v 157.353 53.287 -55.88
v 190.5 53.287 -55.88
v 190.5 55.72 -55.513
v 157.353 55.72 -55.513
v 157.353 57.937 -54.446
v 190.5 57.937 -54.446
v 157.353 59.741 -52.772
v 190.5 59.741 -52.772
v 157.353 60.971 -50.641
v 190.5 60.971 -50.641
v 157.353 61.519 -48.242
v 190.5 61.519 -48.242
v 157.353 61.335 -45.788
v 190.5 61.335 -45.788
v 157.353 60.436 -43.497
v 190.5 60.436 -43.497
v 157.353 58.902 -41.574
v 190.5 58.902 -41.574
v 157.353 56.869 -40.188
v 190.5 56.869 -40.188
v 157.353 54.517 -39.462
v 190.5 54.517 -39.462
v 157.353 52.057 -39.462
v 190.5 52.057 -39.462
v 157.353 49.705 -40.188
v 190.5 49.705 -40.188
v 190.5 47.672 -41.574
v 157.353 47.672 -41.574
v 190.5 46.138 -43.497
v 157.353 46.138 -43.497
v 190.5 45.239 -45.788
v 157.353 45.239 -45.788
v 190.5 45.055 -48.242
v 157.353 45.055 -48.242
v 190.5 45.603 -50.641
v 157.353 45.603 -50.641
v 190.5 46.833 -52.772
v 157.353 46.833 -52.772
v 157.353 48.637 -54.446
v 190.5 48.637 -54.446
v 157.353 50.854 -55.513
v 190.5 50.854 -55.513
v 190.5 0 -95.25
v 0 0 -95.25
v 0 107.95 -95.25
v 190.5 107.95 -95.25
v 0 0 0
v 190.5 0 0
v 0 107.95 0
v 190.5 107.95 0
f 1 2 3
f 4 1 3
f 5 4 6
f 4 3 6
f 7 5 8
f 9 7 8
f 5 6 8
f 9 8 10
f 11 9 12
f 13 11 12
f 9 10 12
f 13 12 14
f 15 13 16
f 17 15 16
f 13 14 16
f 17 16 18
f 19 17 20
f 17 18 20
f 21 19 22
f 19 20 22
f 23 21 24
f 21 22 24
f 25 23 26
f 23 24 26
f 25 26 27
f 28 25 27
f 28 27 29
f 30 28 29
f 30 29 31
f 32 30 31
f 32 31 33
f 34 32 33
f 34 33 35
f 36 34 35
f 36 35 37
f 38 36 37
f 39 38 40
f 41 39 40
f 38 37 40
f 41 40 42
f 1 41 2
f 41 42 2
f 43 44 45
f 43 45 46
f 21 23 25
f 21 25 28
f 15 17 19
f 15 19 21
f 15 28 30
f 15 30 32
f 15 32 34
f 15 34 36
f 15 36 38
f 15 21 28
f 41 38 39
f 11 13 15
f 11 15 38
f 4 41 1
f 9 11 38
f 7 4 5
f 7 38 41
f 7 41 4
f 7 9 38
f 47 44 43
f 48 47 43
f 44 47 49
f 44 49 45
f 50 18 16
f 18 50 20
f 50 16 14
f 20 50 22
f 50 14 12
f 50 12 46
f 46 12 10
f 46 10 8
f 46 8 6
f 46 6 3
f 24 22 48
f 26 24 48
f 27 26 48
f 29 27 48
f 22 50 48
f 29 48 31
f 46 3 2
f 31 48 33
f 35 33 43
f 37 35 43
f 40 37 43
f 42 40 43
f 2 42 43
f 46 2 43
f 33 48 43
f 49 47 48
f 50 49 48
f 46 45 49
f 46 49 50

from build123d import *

# Parameters (mm, degrees)
SKETCH1_W           = 190.5
SKETCH1_H           = 95.25
BOSS_EXTRUDE1_DEPTH = 107.95
SKETCH2_R           = 8.255
CUT_EXTRUDE1_DEPTH  = 33.147


with BuildPart() as part:
    # Sketch1 → Boss-Extrude1 (new body)
    with BuildSketch(Plane(origin=(0, 0, 0), x_dir=(1, 0, 0), z_dir=(0, 1, 0))):
        with Locations((95.25, 47.625)):
            Rectangle(SKETCH1_W, SKETCH1_H)
    extrude(amount=BOSS_EXTRUDE1_DEPTH)

    # Sketch2 → Cut-Extrude1 (cut, symmetric)
    with BuildSketch(Plane(origin=(190.5, 0, 0), x_dir=(0, 0, -1), z_dir=(1, 0, 0))):
        with Locations((47.625, 53.286871915)):
            Circle(SKETCH2_R)
    extrude(amount=CUT_EXTRUDE1_DEPTH, both=True, mode=Mode.SUBTRACT)


solid = part.part
